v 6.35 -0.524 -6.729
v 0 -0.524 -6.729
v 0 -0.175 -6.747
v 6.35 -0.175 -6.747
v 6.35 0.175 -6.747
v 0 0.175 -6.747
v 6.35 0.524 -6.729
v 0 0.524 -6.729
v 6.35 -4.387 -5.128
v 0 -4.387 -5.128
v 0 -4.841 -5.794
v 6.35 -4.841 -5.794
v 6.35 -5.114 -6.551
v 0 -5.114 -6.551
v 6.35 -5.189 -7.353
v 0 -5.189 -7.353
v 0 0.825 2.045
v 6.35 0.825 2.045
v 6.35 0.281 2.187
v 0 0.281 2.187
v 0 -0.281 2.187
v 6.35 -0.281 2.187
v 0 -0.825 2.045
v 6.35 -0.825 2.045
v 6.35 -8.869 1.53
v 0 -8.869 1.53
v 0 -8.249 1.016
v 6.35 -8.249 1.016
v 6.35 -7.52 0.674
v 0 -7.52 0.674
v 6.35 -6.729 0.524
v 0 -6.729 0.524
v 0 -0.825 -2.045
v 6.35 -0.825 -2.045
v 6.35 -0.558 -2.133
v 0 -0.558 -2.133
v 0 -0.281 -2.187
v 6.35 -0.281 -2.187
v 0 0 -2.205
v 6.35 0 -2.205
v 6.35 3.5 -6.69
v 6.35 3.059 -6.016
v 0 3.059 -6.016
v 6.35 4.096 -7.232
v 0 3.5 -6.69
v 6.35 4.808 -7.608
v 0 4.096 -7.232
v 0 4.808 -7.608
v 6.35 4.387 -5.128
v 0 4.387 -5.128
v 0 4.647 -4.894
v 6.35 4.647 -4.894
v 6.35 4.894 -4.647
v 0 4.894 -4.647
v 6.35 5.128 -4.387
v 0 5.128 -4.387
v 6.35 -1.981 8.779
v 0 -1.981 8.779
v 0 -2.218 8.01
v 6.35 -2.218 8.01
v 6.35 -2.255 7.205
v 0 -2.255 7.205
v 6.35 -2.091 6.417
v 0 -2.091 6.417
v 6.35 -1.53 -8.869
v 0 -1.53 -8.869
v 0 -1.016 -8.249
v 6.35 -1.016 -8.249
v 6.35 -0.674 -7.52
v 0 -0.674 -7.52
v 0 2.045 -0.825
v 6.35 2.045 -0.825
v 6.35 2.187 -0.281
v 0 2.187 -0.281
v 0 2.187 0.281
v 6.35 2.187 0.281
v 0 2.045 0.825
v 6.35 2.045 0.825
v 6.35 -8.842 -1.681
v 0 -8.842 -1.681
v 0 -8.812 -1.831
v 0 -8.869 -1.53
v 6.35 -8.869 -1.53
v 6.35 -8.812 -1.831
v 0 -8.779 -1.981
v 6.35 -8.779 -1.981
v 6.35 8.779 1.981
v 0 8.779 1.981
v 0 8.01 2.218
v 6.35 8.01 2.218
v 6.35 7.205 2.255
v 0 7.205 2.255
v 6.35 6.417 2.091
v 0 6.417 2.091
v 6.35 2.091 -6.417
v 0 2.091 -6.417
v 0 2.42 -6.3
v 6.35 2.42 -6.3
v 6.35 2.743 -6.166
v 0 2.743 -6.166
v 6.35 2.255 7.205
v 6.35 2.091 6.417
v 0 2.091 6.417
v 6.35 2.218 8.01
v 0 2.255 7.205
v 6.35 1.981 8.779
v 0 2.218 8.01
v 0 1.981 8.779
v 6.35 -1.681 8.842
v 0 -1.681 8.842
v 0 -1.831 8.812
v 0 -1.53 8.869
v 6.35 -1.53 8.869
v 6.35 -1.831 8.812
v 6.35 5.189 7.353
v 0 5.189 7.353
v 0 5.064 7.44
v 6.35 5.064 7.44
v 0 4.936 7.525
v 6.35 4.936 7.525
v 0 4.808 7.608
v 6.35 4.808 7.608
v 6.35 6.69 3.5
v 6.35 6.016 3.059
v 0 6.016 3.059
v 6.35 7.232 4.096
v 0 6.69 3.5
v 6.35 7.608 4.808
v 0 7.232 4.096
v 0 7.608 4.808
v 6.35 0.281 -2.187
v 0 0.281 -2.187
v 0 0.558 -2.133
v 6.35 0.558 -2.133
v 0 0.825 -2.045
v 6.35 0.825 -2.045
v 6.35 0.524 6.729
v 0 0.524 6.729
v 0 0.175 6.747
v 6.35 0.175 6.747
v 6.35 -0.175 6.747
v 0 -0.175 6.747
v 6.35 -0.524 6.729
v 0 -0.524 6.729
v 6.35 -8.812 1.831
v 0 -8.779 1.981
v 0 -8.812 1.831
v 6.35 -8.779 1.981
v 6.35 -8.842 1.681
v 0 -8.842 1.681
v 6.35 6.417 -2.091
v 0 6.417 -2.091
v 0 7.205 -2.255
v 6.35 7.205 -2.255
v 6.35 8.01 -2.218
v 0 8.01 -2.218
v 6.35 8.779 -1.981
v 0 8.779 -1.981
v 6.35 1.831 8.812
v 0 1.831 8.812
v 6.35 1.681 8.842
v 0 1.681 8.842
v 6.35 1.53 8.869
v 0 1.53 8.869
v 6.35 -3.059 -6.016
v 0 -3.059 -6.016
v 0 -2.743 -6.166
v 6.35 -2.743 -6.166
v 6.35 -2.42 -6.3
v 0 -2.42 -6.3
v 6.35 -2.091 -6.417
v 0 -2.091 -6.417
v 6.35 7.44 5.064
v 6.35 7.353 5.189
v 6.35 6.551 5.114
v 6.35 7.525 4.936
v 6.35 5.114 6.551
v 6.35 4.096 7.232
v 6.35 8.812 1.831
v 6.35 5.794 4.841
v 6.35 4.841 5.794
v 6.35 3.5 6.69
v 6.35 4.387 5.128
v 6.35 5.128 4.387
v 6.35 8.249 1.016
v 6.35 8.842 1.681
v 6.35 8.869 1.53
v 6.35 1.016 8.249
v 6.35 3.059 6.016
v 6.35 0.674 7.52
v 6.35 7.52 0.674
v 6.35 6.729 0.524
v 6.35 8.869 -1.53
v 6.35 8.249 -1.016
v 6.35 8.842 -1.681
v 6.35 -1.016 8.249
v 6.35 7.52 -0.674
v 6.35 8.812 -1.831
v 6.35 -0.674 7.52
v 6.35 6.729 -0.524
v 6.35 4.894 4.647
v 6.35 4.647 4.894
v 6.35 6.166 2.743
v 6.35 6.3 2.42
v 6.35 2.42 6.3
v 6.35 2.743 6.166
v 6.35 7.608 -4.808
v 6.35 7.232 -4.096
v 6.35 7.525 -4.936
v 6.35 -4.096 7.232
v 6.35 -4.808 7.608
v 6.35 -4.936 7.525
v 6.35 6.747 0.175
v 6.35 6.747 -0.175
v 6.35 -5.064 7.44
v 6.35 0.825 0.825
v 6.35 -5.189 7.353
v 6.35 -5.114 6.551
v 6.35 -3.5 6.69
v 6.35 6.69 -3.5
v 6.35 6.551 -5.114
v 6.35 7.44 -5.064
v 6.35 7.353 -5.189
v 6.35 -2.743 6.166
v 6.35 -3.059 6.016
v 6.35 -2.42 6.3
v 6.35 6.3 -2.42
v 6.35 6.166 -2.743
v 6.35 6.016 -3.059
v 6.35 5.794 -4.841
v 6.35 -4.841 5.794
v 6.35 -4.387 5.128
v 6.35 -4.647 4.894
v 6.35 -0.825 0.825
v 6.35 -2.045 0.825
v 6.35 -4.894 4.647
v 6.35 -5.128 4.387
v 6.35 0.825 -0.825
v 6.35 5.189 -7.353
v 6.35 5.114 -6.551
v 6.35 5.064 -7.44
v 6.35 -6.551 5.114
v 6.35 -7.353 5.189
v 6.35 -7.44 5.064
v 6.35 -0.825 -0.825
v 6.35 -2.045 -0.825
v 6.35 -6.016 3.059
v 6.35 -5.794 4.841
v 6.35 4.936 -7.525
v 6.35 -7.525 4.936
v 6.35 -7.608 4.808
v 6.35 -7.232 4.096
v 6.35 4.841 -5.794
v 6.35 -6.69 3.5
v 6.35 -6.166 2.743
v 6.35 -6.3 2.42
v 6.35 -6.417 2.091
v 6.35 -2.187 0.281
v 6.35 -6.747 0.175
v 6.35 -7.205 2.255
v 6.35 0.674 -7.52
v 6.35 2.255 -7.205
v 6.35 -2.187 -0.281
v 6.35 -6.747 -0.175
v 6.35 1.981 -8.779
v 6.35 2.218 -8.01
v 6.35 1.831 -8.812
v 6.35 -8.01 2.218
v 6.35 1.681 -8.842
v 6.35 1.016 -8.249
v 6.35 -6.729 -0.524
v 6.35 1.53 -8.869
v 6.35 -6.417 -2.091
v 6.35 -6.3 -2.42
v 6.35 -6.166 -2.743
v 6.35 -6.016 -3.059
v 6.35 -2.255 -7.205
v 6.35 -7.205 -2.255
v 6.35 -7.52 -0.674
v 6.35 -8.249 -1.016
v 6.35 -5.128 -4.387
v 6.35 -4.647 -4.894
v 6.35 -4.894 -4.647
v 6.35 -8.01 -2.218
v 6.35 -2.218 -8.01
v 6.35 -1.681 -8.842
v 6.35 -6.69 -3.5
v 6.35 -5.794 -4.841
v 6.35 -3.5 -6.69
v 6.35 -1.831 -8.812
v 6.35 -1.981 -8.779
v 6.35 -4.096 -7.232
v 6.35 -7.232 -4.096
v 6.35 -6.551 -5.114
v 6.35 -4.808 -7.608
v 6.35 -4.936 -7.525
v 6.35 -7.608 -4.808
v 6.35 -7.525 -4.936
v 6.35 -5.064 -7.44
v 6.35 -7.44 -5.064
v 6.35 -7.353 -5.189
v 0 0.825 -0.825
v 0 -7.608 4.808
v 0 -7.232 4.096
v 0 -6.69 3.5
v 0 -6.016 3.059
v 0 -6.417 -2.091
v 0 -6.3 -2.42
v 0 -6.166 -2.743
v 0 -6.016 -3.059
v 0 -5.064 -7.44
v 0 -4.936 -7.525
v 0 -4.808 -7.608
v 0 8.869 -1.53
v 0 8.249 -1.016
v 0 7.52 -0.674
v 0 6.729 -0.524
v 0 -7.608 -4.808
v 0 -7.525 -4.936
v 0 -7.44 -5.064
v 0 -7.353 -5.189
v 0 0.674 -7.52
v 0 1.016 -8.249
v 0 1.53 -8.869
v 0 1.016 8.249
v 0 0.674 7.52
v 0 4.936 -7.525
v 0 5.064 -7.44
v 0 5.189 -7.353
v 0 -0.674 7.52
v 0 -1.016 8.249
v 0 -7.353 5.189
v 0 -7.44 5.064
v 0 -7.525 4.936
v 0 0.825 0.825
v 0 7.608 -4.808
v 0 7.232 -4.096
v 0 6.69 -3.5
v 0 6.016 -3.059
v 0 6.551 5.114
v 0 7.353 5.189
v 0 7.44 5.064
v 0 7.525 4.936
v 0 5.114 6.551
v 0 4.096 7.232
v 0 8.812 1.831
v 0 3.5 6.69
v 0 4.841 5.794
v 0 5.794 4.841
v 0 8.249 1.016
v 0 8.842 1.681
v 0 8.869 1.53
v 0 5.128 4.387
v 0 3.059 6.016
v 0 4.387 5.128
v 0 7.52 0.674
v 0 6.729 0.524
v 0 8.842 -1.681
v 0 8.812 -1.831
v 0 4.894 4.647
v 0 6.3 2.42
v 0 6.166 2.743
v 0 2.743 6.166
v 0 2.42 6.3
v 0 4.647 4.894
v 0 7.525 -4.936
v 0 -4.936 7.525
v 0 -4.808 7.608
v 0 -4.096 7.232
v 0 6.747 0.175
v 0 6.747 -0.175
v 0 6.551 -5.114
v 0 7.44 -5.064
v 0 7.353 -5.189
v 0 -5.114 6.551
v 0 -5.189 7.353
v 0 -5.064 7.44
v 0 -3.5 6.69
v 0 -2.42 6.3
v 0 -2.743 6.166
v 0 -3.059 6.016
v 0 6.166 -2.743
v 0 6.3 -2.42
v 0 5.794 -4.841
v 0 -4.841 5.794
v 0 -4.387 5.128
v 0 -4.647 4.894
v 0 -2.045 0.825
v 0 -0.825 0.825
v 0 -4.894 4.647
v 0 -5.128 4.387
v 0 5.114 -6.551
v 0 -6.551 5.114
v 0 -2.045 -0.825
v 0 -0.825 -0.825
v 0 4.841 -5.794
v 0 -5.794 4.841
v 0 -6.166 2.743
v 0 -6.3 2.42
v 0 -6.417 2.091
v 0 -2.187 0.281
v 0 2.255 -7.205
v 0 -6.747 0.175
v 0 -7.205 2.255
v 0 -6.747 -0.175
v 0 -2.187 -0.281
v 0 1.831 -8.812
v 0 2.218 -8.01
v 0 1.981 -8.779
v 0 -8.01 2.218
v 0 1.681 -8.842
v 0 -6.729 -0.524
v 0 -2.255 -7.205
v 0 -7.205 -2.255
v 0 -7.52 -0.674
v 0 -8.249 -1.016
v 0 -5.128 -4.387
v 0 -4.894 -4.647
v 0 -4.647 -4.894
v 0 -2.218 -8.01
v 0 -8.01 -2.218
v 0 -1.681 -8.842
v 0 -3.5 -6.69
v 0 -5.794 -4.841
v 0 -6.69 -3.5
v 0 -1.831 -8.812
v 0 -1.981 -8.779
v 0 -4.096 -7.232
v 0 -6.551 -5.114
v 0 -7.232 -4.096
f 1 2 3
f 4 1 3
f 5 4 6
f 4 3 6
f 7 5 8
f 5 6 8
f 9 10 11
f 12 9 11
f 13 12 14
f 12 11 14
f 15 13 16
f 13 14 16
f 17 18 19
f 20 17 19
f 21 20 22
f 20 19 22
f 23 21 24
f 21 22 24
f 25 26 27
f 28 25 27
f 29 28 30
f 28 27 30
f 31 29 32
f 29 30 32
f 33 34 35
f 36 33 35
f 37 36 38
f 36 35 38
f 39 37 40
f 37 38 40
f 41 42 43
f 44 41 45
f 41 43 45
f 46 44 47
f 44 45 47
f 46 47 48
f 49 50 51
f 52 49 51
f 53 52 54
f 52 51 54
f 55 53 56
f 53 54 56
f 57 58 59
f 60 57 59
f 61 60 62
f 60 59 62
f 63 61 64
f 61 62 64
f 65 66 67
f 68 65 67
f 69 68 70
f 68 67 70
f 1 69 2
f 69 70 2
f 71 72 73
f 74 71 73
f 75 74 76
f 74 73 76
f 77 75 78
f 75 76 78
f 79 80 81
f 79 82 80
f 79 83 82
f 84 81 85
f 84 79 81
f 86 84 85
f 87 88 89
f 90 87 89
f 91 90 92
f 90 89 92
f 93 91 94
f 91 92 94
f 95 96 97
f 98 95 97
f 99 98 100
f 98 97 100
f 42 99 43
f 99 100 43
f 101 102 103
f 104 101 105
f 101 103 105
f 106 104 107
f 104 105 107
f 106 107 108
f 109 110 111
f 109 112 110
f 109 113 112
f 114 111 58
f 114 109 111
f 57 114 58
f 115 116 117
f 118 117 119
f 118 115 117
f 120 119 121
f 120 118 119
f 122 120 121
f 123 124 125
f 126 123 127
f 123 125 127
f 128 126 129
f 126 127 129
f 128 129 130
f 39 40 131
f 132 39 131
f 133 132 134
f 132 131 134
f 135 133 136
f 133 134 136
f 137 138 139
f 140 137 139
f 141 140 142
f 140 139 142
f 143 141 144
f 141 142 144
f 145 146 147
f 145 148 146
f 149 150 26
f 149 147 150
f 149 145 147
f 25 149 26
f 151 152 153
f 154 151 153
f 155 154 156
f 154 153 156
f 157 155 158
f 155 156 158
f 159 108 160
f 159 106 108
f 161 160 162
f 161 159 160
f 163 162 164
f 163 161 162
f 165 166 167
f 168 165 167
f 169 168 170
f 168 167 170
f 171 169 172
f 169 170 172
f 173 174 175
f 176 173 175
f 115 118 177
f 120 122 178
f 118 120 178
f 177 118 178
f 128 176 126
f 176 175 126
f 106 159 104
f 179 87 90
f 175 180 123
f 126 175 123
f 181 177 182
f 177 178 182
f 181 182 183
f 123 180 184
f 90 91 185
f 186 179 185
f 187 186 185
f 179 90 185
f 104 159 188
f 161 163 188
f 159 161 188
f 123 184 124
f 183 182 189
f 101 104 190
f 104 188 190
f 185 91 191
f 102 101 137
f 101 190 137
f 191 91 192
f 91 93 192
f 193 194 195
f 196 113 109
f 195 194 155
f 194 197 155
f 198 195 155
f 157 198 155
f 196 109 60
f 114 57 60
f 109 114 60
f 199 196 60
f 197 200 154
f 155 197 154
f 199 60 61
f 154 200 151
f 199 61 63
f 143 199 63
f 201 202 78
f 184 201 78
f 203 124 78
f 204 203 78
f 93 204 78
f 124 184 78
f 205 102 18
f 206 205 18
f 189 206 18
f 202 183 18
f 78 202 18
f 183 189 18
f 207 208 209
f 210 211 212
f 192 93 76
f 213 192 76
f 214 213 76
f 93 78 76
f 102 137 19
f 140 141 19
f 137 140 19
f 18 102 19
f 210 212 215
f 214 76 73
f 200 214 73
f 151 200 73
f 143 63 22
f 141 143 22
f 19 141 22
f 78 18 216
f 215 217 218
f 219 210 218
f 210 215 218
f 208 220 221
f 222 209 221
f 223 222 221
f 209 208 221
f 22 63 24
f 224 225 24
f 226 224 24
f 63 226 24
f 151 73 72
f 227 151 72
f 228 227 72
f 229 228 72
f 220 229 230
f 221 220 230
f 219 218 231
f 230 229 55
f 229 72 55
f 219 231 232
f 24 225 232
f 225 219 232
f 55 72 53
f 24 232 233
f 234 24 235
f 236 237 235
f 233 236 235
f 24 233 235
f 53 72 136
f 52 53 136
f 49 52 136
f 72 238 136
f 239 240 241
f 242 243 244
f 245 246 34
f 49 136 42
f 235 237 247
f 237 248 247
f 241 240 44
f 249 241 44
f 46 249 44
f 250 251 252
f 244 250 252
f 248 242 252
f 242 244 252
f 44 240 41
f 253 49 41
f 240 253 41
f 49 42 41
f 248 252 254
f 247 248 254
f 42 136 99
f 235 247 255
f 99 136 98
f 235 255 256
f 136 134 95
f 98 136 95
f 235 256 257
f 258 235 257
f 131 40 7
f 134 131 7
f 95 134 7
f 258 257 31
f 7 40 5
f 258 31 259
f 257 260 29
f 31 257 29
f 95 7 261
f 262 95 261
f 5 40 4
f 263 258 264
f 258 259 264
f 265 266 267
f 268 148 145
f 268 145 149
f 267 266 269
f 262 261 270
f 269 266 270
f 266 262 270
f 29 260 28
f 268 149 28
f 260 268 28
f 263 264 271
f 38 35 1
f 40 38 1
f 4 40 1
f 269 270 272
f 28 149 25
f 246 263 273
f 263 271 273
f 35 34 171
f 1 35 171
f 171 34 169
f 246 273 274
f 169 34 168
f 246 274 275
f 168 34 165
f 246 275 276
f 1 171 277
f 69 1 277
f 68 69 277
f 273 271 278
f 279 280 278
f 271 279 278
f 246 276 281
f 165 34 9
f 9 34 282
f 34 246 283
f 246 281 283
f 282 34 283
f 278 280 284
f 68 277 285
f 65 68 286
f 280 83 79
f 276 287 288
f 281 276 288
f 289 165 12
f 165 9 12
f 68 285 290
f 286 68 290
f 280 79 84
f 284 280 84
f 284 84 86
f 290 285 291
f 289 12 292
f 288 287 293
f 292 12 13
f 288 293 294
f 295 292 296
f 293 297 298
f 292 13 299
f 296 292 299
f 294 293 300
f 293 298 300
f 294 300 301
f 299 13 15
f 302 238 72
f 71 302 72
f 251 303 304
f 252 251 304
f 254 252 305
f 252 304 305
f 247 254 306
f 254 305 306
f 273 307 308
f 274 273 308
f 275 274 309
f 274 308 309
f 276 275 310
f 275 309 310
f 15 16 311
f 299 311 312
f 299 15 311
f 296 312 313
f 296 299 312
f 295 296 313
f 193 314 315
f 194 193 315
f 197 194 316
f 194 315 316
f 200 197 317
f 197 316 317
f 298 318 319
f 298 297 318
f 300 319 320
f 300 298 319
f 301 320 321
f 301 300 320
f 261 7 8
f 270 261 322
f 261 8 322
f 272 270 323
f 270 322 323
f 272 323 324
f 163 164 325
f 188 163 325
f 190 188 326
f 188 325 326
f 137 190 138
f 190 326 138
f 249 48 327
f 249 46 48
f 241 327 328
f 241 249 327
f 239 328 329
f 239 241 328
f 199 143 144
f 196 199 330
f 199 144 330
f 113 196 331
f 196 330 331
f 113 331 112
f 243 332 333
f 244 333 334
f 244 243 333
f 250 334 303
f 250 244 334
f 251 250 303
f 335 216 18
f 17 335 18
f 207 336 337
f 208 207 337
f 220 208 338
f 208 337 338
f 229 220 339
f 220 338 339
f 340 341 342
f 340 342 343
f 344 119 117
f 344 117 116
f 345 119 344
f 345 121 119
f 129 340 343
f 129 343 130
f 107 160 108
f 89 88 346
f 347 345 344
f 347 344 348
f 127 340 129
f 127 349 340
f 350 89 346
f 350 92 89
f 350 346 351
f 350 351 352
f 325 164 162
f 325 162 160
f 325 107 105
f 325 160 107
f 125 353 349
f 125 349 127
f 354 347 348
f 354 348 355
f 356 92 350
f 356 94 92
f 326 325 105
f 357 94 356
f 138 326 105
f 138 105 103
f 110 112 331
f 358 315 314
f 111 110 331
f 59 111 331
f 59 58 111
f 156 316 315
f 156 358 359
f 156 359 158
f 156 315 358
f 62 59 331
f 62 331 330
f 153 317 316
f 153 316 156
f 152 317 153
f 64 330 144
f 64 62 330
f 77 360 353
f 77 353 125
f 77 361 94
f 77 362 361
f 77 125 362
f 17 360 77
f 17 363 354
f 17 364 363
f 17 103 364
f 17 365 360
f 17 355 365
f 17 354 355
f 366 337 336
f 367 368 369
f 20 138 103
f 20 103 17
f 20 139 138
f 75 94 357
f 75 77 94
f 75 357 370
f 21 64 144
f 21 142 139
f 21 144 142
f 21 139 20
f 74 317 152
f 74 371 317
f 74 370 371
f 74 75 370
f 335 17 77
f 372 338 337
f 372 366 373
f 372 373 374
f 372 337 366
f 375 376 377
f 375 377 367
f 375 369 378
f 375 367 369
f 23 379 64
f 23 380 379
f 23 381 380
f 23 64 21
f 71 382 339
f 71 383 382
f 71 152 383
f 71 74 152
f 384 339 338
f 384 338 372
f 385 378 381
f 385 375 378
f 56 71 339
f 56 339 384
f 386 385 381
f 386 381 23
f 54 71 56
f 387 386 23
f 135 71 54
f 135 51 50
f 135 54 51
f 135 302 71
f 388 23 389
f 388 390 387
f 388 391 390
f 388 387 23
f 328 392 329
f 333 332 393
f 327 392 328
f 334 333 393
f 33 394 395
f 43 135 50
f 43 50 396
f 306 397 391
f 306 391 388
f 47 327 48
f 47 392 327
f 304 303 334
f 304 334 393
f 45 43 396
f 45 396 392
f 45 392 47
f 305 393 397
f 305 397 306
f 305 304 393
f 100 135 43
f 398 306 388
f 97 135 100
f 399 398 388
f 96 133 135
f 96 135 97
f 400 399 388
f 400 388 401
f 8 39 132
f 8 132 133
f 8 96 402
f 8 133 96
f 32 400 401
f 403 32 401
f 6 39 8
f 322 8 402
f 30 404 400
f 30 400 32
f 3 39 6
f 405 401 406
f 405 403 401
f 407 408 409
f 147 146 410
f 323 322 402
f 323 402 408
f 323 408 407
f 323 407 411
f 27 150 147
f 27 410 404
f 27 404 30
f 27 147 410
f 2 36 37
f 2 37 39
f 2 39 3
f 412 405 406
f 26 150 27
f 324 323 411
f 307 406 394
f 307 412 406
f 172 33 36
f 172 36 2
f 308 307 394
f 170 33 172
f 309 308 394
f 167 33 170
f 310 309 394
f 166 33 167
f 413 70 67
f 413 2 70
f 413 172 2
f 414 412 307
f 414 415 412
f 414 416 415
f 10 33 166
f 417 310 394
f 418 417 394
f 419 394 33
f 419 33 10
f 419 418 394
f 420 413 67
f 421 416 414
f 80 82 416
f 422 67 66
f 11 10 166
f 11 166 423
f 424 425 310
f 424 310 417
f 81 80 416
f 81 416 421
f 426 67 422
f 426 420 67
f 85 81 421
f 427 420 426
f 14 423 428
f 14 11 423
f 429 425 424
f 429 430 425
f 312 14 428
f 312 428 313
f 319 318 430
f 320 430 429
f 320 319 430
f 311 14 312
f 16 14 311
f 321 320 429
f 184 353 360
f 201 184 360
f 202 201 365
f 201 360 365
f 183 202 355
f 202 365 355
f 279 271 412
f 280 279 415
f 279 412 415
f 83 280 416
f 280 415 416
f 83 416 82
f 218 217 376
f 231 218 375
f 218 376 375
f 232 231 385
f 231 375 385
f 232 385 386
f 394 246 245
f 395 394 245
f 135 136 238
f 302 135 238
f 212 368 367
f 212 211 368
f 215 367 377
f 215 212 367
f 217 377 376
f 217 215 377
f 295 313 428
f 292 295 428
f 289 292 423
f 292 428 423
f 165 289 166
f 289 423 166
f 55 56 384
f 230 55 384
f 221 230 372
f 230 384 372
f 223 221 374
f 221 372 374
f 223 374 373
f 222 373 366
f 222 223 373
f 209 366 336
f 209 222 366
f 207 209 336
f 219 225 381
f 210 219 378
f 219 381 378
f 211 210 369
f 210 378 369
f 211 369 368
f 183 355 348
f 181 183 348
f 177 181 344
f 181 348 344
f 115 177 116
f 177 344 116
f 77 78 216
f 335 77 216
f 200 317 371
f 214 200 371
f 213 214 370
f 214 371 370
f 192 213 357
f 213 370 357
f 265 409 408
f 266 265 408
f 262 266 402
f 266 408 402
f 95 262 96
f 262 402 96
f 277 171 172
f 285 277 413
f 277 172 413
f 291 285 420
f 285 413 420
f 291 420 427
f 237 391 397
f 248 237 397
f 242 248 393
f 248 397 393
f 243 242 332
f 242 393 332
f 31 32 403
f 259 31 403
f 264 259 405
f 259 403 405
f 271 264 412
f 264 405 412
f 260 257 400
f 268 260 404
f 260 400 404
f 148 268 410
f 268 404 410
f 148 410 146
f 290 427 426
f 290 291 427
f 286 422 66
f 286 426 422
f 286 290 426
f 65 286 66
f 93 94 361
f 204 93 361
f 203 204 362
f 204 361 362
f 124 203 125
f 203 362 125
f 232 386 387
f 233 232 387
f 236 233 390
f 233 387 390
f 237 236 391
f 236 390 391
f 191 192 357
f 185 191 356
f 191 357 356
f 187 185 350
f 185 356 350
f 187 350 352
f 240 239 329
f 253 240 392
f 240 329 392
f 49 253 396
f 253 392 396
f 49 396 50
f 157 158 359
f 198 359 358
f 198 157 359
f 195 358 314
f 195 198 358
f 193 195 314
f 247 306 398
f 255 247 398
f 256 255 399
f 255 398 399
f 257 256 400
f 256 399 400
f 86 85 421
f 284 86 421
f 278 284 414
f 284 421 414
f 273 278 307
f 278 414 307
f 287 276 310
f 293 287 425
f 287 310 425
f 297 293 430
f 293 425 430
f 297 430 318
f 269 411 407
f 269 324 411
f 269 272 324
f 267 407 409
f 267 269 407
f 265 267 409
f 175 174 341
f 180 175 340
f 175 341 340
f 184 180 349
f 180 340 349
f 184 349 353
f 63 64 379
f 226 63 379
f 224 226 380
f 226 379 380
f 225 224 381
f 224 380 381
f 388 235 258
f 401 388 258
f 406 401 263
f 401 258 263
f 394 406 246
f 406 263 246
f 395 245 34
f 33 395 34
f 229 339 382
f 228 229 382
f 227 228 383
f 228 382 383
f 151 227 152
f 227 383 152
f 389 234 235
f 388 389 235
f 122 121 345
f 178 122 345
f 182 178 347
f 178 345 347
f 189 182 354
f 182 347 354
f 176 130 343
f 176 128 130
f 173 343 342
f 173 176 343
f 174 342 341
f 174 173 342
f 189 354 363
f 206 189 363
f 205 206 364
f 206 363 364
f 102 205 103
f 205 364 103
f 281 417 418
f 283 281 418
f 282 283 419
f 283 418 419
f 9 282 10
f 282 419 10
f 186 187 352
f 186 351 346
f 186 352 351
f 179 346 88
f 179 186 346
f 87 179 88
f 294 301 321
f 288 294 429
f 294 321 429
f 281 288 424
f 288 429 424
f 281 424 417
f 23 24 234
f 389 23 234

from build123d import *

# Parameters (mm, degrees)
BASPROSKE_W        = 6.35
BASPROSKE_H        = 9
TOOTHCUT_DEPTH     = 15.224011389
TEETHCUTS_COUNT    = 16
TEETHCUTS_ANGLE    = 337.5
BORSKE_R           = 0.5
BORE_DEPTH         = 50.0000508
CUT_EXTRUDE1_DEPTH = 10


with BuildPart() as part:
    # BasProSke → Base-Revolve (revolve)
    with BuildSketch(Plane(origin=(0, 0, 0), x_dir=(1, 0, 0), z_dir=(0, 1, 0)), mode=Mode.PRIVATE) as base_revolve_sk:
        with Locations((3.175, 4.5)):
            Rectangle(BASPROSKE_W, BASPROSKE_H)
    revolve(base_revolve_sk.sketch.rotate(Axis((-10, 0, 0), (1, 0, 0)), 180), axis=Axis((-10, 0, 0), (1, 0, 0)))

    # TooCutSke → ToothCut (cut, through all)
    with BuildSketch(Plane(origin=(0, 0, 0), x_dir=(0, 0, -1), z_dir=(1, 0, 0))):
        with BuildLine():
            ThreePointArc((0.523792937, 6.728643397), (0, 6.749), (-0.523792937, 6.728643397))
            ThreePointArc((-0.523792937, 6.728643397), (-0.828704482, 7.90962059), (-1.553355277, 8.890721711))
            ThreePointArc((-1.553355277, 8.890721711), (0, 9.0254), (1.553355277, 8.890721711))
            ThreePointArc((1.553355277, 8.890721711), (0.828704482, 7.90962059), (0.523792937, 6.728643397))
        make_face()
    toothcut = extrude(amount=TOOTHCUT_DEPTH, mode=Mode.SUBTRACT)

    # TeethCuts: ToothCut ×16 about axis
    teethcuts_axis = Axis((-10, 0, 0), (1, 0, 0))
    for i in range(1, TEETHCUTS_COUNT):
        add(toothcut.rotate(teethcuts_axis, i * TEETHCUTS_ANGLE / (TEETHCUTS_COUNT - 1)), mode=Mode.SUBTRACT)

    # BorSke → Bore (cut, symmetric)
    with BuildSketch(Plane(origin=(0, 0, 0), x_dir=(0, 0, -1), z_dir=(1, 0, 0))):
        with Locations(Location((0, 0, 0), (0, 0, 180))):
            Circle(BORSKE_R)
    extrude(amount=BORE_DEPTH, both=True, mode=Mode.SUBTRACT)

    # Sketch1 → Cut-Extrude1 (cut)
    with BuildSketch(Plane(origin=(6.35, 0, 0), x_dir=(0, 0, -1), z_dir=(1, 0, 0))):
        with BuildLine():
            ThreePointArc((0.824891111, 2.044891111), (0, 2.205), (-0.824891111, 2.044891111))
            Line((-0.824891111, 2.044891111), (-0.824891111, 0.824891111))
            Line((-0.824891111, 0.824891111), (-2.044891111, 0.824891111))
            ThreePointArc((-2.044891111, 0.824891111), (-2.205, 0), (-2.044891111, -0.824891111))
            Line((-2.044891111, -0.824891111), (-0.824891111, -0.824891111))
            Line((-0.824891111, -0.824891111), (-0.824891111, -2.044891111))
            ThreePointArc((-0.824891111, -2.044891111), (0, -2.205), (0.824891111, -2.044891111))
            Line((0.824891111, -2.044891111), (0.824891111, -0.824891111))
            Line((0.824891111, -0.824891111), (2.044891111, -0.824891111))
            ThreePointArc((2.044891111, -0.824891111), (2.164602723, -0.420142893), (2.205, 0))
            ThreePointArc((2.205, 0), (2.164602723, 0.420142893), (2.044891111, 0.824891111))
            Line((2.044891111, 0.824891111), (0.824891111, 0.824891111))
            Line((0.824891111, 0.824891111), (0.824891111, 2.044891111))
        make_face()
    extrude(amount=-CUT_EXTRUDE1_DEPTH, mode=Mode.SUBTRACT)


solid = part.part
